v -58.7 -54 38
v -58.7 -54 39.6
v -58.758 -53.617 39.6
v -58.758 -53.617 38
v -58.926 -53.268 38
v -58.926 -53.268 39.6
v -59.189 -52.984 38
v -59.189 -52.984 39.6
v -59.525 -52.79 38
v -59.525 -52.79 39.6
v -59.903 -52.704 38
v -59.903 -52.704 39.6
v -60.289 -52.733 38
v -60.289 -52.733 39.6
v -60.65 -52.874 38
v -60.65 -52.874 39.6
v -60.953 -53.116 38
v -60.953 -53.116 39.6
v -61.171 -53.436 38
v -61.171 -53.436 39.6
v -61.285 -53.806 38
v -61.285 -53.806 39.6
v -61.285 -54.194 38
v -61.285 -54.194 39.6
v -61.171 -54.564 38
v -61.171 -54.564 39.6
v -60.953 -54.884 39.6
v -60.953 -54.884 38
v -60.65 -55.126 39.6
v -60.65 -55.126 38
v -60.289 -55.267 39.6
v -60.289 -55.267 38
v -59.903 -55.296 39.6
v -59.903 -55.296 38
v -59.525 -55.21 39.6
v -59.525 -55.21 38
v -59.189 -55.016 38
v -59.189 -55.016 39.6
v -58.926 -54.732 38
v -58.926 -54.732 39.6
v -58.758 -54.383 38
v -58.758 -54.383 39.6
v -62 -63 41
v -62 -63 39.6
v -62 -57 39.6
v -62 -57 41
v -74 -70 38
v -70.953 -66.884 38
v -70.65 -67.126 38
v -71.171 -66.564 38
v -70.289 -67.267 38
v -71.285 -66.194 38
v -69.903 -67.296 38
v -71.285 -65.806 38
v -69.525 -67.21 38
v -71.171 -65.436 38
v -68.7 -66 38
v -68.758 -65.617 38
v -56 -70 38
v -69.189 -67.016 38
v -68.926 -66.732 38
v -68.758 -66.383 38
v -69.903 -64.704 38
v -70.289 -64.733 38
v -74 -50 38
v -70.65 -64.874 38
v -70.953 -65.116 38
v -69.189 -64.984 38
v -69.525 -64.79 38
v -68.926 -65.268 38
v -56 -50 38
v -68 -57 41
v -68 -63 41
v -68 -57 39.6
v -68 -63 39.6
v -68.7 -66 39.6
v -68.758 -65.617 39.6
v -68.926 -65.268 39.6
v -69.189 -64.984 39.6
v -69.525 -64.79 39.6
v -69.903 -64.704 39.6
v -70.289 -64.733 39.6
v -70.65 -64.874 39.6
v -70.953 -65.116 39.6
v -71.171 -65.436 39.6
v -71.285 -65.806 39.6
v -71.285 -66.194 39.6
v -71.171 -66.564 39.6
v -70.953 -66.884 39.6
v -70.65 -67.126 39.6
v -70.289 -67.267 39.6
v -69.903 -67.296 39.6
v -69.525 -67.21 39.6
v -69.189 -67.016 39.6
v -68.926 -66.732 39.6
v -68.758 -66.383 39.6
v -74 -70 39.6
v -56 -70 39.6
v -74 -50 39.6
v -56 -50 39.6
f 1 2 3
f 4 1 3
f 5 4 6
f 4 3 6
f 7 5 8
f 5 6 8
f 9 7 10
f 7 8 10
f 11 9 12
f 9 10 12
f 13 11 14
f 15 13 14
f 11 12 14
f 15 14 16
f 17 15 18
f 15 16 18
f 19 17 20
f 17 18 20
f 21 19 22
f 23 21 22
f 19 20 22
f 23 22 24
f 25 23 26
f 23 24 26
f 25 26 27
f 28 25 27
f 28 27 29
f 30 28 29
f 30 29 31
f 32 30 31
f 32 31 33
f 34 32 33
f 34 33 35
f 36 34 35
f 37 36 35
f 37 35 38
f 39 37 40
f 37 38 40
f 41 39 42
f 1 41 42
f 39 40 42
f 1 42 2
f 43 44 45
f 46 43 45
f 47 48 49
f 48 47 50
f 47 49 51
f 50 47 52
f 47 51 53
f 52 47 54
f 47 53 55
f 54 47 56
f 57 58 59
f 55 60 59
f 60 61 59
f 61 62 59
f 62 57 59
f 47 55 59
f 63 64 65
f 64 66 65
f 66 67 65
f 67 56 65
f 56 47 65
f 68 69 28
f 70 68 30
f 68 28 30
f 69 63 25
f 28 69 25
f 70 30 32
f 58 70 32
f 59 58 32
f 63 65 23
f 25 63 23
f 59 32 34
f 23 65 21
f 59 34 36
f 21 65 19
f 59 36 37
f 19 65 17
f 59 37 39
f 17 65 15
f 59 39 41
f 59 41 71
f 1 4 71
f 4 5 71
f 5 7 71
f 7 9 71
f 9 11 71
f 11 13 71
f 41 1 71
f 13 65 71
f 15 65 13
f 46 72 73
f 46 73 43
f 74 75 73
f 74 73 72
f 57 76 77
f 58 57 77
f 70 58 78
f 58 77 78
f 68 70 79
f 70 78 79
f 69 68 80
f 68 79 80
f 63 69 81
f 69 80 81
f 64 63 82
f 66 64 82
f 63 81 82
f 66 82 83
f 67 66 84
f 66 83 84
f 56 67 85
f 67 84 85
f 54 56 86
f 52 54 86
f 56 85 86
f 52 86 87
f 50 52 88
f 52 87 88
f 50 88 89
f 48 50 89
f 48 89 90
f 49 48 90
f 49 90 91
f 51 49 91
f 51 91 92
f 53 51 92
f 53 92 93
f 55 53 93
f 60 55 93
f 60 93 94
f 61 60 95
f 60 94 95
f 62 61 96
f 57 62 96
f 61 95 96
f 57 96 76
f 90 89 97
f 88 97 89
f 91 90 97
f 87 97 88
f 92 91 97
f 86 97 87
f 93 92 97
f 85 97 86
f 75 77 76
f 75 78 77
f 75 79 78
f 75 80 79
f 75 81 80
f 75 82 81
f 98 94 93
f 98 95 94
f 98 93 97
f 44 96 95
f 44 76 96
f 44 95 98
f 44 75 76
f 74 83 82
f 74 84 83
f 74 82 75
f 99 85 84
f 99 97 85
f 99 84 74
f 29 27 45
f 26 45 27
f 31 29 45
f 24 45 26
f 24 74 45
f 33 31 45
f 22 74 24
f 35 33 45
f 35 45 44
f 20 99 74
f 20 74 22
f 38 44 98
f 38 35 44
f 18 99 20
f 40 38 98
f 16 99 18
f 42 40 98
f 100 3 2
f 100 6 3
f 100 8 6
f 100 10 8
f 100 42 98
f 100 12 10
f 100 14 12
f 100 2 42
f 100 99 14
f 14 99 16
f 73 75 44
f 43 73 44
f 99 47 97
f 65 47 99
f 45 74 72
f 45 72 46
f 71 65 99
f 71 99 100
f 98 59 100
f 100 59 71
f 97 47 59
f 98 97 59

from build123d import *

# Parameters (mm, degrees)
V10_IMU_CANDIDATE18X20_START           = 38
SKETCH_2_W                             = 18
SKETCH_2_H                             = 20
V10_IMU_CANDIDATE18X20_DEPTH           = 1.6
V10_IMU_PACKAGE_START                  = 39.6
SKETCH_3_W                             = 6
SKETCH_3_H                             = 6
V10_IMU_PACKAGE_DEPTH                  = 1.4
SKETCH_4_R                             = 1.3
V10_IMU_DIAGONAL_CANDIDATE_HOLES_DEPTH = 1.6


with BuildPart() as part:
    # 草图2 → V10_IMU_candidate18x20 (new body)
    with BuildSketch(Plane.XY.offset(V10_IMU_CANDIDATE18X20_START)):
        with Locations((-65, -60)):
            Rectangle(SKETCH_2_W, SKETCH_2_H)
    extrude(amount=V10_IMU_CANDIDATE18X20_DEPTH)

    # 草图3 → V10_IMU_package (add)
    with BuildSketch(Plane.XY.offset(V10_IMU_PACKAGE_START)):
        with Locations((-65, -60)):
            Rectangle(SKETCH_3_W, SKETCH_3_H)
    extrude(amount=V10_IMU_PACKAGE_DEPTH)

    # 草图4 → V10_IMU_diagonal_candidate_holes (cut)
    with BuildSketch(Plane.XY.offset(39.6)):
        with Locations((-70, -66)):
            Circle(SKETCH_4_R)
        with Locations((-60, -54)):
            Circle(SKETCH_4_R)
    extrude(amount=-V10_IMU_DIAGONAL_CANDIDATE_HOLES_DEPTH, mode=Mode.SUBTRACT)


solid = part.part
